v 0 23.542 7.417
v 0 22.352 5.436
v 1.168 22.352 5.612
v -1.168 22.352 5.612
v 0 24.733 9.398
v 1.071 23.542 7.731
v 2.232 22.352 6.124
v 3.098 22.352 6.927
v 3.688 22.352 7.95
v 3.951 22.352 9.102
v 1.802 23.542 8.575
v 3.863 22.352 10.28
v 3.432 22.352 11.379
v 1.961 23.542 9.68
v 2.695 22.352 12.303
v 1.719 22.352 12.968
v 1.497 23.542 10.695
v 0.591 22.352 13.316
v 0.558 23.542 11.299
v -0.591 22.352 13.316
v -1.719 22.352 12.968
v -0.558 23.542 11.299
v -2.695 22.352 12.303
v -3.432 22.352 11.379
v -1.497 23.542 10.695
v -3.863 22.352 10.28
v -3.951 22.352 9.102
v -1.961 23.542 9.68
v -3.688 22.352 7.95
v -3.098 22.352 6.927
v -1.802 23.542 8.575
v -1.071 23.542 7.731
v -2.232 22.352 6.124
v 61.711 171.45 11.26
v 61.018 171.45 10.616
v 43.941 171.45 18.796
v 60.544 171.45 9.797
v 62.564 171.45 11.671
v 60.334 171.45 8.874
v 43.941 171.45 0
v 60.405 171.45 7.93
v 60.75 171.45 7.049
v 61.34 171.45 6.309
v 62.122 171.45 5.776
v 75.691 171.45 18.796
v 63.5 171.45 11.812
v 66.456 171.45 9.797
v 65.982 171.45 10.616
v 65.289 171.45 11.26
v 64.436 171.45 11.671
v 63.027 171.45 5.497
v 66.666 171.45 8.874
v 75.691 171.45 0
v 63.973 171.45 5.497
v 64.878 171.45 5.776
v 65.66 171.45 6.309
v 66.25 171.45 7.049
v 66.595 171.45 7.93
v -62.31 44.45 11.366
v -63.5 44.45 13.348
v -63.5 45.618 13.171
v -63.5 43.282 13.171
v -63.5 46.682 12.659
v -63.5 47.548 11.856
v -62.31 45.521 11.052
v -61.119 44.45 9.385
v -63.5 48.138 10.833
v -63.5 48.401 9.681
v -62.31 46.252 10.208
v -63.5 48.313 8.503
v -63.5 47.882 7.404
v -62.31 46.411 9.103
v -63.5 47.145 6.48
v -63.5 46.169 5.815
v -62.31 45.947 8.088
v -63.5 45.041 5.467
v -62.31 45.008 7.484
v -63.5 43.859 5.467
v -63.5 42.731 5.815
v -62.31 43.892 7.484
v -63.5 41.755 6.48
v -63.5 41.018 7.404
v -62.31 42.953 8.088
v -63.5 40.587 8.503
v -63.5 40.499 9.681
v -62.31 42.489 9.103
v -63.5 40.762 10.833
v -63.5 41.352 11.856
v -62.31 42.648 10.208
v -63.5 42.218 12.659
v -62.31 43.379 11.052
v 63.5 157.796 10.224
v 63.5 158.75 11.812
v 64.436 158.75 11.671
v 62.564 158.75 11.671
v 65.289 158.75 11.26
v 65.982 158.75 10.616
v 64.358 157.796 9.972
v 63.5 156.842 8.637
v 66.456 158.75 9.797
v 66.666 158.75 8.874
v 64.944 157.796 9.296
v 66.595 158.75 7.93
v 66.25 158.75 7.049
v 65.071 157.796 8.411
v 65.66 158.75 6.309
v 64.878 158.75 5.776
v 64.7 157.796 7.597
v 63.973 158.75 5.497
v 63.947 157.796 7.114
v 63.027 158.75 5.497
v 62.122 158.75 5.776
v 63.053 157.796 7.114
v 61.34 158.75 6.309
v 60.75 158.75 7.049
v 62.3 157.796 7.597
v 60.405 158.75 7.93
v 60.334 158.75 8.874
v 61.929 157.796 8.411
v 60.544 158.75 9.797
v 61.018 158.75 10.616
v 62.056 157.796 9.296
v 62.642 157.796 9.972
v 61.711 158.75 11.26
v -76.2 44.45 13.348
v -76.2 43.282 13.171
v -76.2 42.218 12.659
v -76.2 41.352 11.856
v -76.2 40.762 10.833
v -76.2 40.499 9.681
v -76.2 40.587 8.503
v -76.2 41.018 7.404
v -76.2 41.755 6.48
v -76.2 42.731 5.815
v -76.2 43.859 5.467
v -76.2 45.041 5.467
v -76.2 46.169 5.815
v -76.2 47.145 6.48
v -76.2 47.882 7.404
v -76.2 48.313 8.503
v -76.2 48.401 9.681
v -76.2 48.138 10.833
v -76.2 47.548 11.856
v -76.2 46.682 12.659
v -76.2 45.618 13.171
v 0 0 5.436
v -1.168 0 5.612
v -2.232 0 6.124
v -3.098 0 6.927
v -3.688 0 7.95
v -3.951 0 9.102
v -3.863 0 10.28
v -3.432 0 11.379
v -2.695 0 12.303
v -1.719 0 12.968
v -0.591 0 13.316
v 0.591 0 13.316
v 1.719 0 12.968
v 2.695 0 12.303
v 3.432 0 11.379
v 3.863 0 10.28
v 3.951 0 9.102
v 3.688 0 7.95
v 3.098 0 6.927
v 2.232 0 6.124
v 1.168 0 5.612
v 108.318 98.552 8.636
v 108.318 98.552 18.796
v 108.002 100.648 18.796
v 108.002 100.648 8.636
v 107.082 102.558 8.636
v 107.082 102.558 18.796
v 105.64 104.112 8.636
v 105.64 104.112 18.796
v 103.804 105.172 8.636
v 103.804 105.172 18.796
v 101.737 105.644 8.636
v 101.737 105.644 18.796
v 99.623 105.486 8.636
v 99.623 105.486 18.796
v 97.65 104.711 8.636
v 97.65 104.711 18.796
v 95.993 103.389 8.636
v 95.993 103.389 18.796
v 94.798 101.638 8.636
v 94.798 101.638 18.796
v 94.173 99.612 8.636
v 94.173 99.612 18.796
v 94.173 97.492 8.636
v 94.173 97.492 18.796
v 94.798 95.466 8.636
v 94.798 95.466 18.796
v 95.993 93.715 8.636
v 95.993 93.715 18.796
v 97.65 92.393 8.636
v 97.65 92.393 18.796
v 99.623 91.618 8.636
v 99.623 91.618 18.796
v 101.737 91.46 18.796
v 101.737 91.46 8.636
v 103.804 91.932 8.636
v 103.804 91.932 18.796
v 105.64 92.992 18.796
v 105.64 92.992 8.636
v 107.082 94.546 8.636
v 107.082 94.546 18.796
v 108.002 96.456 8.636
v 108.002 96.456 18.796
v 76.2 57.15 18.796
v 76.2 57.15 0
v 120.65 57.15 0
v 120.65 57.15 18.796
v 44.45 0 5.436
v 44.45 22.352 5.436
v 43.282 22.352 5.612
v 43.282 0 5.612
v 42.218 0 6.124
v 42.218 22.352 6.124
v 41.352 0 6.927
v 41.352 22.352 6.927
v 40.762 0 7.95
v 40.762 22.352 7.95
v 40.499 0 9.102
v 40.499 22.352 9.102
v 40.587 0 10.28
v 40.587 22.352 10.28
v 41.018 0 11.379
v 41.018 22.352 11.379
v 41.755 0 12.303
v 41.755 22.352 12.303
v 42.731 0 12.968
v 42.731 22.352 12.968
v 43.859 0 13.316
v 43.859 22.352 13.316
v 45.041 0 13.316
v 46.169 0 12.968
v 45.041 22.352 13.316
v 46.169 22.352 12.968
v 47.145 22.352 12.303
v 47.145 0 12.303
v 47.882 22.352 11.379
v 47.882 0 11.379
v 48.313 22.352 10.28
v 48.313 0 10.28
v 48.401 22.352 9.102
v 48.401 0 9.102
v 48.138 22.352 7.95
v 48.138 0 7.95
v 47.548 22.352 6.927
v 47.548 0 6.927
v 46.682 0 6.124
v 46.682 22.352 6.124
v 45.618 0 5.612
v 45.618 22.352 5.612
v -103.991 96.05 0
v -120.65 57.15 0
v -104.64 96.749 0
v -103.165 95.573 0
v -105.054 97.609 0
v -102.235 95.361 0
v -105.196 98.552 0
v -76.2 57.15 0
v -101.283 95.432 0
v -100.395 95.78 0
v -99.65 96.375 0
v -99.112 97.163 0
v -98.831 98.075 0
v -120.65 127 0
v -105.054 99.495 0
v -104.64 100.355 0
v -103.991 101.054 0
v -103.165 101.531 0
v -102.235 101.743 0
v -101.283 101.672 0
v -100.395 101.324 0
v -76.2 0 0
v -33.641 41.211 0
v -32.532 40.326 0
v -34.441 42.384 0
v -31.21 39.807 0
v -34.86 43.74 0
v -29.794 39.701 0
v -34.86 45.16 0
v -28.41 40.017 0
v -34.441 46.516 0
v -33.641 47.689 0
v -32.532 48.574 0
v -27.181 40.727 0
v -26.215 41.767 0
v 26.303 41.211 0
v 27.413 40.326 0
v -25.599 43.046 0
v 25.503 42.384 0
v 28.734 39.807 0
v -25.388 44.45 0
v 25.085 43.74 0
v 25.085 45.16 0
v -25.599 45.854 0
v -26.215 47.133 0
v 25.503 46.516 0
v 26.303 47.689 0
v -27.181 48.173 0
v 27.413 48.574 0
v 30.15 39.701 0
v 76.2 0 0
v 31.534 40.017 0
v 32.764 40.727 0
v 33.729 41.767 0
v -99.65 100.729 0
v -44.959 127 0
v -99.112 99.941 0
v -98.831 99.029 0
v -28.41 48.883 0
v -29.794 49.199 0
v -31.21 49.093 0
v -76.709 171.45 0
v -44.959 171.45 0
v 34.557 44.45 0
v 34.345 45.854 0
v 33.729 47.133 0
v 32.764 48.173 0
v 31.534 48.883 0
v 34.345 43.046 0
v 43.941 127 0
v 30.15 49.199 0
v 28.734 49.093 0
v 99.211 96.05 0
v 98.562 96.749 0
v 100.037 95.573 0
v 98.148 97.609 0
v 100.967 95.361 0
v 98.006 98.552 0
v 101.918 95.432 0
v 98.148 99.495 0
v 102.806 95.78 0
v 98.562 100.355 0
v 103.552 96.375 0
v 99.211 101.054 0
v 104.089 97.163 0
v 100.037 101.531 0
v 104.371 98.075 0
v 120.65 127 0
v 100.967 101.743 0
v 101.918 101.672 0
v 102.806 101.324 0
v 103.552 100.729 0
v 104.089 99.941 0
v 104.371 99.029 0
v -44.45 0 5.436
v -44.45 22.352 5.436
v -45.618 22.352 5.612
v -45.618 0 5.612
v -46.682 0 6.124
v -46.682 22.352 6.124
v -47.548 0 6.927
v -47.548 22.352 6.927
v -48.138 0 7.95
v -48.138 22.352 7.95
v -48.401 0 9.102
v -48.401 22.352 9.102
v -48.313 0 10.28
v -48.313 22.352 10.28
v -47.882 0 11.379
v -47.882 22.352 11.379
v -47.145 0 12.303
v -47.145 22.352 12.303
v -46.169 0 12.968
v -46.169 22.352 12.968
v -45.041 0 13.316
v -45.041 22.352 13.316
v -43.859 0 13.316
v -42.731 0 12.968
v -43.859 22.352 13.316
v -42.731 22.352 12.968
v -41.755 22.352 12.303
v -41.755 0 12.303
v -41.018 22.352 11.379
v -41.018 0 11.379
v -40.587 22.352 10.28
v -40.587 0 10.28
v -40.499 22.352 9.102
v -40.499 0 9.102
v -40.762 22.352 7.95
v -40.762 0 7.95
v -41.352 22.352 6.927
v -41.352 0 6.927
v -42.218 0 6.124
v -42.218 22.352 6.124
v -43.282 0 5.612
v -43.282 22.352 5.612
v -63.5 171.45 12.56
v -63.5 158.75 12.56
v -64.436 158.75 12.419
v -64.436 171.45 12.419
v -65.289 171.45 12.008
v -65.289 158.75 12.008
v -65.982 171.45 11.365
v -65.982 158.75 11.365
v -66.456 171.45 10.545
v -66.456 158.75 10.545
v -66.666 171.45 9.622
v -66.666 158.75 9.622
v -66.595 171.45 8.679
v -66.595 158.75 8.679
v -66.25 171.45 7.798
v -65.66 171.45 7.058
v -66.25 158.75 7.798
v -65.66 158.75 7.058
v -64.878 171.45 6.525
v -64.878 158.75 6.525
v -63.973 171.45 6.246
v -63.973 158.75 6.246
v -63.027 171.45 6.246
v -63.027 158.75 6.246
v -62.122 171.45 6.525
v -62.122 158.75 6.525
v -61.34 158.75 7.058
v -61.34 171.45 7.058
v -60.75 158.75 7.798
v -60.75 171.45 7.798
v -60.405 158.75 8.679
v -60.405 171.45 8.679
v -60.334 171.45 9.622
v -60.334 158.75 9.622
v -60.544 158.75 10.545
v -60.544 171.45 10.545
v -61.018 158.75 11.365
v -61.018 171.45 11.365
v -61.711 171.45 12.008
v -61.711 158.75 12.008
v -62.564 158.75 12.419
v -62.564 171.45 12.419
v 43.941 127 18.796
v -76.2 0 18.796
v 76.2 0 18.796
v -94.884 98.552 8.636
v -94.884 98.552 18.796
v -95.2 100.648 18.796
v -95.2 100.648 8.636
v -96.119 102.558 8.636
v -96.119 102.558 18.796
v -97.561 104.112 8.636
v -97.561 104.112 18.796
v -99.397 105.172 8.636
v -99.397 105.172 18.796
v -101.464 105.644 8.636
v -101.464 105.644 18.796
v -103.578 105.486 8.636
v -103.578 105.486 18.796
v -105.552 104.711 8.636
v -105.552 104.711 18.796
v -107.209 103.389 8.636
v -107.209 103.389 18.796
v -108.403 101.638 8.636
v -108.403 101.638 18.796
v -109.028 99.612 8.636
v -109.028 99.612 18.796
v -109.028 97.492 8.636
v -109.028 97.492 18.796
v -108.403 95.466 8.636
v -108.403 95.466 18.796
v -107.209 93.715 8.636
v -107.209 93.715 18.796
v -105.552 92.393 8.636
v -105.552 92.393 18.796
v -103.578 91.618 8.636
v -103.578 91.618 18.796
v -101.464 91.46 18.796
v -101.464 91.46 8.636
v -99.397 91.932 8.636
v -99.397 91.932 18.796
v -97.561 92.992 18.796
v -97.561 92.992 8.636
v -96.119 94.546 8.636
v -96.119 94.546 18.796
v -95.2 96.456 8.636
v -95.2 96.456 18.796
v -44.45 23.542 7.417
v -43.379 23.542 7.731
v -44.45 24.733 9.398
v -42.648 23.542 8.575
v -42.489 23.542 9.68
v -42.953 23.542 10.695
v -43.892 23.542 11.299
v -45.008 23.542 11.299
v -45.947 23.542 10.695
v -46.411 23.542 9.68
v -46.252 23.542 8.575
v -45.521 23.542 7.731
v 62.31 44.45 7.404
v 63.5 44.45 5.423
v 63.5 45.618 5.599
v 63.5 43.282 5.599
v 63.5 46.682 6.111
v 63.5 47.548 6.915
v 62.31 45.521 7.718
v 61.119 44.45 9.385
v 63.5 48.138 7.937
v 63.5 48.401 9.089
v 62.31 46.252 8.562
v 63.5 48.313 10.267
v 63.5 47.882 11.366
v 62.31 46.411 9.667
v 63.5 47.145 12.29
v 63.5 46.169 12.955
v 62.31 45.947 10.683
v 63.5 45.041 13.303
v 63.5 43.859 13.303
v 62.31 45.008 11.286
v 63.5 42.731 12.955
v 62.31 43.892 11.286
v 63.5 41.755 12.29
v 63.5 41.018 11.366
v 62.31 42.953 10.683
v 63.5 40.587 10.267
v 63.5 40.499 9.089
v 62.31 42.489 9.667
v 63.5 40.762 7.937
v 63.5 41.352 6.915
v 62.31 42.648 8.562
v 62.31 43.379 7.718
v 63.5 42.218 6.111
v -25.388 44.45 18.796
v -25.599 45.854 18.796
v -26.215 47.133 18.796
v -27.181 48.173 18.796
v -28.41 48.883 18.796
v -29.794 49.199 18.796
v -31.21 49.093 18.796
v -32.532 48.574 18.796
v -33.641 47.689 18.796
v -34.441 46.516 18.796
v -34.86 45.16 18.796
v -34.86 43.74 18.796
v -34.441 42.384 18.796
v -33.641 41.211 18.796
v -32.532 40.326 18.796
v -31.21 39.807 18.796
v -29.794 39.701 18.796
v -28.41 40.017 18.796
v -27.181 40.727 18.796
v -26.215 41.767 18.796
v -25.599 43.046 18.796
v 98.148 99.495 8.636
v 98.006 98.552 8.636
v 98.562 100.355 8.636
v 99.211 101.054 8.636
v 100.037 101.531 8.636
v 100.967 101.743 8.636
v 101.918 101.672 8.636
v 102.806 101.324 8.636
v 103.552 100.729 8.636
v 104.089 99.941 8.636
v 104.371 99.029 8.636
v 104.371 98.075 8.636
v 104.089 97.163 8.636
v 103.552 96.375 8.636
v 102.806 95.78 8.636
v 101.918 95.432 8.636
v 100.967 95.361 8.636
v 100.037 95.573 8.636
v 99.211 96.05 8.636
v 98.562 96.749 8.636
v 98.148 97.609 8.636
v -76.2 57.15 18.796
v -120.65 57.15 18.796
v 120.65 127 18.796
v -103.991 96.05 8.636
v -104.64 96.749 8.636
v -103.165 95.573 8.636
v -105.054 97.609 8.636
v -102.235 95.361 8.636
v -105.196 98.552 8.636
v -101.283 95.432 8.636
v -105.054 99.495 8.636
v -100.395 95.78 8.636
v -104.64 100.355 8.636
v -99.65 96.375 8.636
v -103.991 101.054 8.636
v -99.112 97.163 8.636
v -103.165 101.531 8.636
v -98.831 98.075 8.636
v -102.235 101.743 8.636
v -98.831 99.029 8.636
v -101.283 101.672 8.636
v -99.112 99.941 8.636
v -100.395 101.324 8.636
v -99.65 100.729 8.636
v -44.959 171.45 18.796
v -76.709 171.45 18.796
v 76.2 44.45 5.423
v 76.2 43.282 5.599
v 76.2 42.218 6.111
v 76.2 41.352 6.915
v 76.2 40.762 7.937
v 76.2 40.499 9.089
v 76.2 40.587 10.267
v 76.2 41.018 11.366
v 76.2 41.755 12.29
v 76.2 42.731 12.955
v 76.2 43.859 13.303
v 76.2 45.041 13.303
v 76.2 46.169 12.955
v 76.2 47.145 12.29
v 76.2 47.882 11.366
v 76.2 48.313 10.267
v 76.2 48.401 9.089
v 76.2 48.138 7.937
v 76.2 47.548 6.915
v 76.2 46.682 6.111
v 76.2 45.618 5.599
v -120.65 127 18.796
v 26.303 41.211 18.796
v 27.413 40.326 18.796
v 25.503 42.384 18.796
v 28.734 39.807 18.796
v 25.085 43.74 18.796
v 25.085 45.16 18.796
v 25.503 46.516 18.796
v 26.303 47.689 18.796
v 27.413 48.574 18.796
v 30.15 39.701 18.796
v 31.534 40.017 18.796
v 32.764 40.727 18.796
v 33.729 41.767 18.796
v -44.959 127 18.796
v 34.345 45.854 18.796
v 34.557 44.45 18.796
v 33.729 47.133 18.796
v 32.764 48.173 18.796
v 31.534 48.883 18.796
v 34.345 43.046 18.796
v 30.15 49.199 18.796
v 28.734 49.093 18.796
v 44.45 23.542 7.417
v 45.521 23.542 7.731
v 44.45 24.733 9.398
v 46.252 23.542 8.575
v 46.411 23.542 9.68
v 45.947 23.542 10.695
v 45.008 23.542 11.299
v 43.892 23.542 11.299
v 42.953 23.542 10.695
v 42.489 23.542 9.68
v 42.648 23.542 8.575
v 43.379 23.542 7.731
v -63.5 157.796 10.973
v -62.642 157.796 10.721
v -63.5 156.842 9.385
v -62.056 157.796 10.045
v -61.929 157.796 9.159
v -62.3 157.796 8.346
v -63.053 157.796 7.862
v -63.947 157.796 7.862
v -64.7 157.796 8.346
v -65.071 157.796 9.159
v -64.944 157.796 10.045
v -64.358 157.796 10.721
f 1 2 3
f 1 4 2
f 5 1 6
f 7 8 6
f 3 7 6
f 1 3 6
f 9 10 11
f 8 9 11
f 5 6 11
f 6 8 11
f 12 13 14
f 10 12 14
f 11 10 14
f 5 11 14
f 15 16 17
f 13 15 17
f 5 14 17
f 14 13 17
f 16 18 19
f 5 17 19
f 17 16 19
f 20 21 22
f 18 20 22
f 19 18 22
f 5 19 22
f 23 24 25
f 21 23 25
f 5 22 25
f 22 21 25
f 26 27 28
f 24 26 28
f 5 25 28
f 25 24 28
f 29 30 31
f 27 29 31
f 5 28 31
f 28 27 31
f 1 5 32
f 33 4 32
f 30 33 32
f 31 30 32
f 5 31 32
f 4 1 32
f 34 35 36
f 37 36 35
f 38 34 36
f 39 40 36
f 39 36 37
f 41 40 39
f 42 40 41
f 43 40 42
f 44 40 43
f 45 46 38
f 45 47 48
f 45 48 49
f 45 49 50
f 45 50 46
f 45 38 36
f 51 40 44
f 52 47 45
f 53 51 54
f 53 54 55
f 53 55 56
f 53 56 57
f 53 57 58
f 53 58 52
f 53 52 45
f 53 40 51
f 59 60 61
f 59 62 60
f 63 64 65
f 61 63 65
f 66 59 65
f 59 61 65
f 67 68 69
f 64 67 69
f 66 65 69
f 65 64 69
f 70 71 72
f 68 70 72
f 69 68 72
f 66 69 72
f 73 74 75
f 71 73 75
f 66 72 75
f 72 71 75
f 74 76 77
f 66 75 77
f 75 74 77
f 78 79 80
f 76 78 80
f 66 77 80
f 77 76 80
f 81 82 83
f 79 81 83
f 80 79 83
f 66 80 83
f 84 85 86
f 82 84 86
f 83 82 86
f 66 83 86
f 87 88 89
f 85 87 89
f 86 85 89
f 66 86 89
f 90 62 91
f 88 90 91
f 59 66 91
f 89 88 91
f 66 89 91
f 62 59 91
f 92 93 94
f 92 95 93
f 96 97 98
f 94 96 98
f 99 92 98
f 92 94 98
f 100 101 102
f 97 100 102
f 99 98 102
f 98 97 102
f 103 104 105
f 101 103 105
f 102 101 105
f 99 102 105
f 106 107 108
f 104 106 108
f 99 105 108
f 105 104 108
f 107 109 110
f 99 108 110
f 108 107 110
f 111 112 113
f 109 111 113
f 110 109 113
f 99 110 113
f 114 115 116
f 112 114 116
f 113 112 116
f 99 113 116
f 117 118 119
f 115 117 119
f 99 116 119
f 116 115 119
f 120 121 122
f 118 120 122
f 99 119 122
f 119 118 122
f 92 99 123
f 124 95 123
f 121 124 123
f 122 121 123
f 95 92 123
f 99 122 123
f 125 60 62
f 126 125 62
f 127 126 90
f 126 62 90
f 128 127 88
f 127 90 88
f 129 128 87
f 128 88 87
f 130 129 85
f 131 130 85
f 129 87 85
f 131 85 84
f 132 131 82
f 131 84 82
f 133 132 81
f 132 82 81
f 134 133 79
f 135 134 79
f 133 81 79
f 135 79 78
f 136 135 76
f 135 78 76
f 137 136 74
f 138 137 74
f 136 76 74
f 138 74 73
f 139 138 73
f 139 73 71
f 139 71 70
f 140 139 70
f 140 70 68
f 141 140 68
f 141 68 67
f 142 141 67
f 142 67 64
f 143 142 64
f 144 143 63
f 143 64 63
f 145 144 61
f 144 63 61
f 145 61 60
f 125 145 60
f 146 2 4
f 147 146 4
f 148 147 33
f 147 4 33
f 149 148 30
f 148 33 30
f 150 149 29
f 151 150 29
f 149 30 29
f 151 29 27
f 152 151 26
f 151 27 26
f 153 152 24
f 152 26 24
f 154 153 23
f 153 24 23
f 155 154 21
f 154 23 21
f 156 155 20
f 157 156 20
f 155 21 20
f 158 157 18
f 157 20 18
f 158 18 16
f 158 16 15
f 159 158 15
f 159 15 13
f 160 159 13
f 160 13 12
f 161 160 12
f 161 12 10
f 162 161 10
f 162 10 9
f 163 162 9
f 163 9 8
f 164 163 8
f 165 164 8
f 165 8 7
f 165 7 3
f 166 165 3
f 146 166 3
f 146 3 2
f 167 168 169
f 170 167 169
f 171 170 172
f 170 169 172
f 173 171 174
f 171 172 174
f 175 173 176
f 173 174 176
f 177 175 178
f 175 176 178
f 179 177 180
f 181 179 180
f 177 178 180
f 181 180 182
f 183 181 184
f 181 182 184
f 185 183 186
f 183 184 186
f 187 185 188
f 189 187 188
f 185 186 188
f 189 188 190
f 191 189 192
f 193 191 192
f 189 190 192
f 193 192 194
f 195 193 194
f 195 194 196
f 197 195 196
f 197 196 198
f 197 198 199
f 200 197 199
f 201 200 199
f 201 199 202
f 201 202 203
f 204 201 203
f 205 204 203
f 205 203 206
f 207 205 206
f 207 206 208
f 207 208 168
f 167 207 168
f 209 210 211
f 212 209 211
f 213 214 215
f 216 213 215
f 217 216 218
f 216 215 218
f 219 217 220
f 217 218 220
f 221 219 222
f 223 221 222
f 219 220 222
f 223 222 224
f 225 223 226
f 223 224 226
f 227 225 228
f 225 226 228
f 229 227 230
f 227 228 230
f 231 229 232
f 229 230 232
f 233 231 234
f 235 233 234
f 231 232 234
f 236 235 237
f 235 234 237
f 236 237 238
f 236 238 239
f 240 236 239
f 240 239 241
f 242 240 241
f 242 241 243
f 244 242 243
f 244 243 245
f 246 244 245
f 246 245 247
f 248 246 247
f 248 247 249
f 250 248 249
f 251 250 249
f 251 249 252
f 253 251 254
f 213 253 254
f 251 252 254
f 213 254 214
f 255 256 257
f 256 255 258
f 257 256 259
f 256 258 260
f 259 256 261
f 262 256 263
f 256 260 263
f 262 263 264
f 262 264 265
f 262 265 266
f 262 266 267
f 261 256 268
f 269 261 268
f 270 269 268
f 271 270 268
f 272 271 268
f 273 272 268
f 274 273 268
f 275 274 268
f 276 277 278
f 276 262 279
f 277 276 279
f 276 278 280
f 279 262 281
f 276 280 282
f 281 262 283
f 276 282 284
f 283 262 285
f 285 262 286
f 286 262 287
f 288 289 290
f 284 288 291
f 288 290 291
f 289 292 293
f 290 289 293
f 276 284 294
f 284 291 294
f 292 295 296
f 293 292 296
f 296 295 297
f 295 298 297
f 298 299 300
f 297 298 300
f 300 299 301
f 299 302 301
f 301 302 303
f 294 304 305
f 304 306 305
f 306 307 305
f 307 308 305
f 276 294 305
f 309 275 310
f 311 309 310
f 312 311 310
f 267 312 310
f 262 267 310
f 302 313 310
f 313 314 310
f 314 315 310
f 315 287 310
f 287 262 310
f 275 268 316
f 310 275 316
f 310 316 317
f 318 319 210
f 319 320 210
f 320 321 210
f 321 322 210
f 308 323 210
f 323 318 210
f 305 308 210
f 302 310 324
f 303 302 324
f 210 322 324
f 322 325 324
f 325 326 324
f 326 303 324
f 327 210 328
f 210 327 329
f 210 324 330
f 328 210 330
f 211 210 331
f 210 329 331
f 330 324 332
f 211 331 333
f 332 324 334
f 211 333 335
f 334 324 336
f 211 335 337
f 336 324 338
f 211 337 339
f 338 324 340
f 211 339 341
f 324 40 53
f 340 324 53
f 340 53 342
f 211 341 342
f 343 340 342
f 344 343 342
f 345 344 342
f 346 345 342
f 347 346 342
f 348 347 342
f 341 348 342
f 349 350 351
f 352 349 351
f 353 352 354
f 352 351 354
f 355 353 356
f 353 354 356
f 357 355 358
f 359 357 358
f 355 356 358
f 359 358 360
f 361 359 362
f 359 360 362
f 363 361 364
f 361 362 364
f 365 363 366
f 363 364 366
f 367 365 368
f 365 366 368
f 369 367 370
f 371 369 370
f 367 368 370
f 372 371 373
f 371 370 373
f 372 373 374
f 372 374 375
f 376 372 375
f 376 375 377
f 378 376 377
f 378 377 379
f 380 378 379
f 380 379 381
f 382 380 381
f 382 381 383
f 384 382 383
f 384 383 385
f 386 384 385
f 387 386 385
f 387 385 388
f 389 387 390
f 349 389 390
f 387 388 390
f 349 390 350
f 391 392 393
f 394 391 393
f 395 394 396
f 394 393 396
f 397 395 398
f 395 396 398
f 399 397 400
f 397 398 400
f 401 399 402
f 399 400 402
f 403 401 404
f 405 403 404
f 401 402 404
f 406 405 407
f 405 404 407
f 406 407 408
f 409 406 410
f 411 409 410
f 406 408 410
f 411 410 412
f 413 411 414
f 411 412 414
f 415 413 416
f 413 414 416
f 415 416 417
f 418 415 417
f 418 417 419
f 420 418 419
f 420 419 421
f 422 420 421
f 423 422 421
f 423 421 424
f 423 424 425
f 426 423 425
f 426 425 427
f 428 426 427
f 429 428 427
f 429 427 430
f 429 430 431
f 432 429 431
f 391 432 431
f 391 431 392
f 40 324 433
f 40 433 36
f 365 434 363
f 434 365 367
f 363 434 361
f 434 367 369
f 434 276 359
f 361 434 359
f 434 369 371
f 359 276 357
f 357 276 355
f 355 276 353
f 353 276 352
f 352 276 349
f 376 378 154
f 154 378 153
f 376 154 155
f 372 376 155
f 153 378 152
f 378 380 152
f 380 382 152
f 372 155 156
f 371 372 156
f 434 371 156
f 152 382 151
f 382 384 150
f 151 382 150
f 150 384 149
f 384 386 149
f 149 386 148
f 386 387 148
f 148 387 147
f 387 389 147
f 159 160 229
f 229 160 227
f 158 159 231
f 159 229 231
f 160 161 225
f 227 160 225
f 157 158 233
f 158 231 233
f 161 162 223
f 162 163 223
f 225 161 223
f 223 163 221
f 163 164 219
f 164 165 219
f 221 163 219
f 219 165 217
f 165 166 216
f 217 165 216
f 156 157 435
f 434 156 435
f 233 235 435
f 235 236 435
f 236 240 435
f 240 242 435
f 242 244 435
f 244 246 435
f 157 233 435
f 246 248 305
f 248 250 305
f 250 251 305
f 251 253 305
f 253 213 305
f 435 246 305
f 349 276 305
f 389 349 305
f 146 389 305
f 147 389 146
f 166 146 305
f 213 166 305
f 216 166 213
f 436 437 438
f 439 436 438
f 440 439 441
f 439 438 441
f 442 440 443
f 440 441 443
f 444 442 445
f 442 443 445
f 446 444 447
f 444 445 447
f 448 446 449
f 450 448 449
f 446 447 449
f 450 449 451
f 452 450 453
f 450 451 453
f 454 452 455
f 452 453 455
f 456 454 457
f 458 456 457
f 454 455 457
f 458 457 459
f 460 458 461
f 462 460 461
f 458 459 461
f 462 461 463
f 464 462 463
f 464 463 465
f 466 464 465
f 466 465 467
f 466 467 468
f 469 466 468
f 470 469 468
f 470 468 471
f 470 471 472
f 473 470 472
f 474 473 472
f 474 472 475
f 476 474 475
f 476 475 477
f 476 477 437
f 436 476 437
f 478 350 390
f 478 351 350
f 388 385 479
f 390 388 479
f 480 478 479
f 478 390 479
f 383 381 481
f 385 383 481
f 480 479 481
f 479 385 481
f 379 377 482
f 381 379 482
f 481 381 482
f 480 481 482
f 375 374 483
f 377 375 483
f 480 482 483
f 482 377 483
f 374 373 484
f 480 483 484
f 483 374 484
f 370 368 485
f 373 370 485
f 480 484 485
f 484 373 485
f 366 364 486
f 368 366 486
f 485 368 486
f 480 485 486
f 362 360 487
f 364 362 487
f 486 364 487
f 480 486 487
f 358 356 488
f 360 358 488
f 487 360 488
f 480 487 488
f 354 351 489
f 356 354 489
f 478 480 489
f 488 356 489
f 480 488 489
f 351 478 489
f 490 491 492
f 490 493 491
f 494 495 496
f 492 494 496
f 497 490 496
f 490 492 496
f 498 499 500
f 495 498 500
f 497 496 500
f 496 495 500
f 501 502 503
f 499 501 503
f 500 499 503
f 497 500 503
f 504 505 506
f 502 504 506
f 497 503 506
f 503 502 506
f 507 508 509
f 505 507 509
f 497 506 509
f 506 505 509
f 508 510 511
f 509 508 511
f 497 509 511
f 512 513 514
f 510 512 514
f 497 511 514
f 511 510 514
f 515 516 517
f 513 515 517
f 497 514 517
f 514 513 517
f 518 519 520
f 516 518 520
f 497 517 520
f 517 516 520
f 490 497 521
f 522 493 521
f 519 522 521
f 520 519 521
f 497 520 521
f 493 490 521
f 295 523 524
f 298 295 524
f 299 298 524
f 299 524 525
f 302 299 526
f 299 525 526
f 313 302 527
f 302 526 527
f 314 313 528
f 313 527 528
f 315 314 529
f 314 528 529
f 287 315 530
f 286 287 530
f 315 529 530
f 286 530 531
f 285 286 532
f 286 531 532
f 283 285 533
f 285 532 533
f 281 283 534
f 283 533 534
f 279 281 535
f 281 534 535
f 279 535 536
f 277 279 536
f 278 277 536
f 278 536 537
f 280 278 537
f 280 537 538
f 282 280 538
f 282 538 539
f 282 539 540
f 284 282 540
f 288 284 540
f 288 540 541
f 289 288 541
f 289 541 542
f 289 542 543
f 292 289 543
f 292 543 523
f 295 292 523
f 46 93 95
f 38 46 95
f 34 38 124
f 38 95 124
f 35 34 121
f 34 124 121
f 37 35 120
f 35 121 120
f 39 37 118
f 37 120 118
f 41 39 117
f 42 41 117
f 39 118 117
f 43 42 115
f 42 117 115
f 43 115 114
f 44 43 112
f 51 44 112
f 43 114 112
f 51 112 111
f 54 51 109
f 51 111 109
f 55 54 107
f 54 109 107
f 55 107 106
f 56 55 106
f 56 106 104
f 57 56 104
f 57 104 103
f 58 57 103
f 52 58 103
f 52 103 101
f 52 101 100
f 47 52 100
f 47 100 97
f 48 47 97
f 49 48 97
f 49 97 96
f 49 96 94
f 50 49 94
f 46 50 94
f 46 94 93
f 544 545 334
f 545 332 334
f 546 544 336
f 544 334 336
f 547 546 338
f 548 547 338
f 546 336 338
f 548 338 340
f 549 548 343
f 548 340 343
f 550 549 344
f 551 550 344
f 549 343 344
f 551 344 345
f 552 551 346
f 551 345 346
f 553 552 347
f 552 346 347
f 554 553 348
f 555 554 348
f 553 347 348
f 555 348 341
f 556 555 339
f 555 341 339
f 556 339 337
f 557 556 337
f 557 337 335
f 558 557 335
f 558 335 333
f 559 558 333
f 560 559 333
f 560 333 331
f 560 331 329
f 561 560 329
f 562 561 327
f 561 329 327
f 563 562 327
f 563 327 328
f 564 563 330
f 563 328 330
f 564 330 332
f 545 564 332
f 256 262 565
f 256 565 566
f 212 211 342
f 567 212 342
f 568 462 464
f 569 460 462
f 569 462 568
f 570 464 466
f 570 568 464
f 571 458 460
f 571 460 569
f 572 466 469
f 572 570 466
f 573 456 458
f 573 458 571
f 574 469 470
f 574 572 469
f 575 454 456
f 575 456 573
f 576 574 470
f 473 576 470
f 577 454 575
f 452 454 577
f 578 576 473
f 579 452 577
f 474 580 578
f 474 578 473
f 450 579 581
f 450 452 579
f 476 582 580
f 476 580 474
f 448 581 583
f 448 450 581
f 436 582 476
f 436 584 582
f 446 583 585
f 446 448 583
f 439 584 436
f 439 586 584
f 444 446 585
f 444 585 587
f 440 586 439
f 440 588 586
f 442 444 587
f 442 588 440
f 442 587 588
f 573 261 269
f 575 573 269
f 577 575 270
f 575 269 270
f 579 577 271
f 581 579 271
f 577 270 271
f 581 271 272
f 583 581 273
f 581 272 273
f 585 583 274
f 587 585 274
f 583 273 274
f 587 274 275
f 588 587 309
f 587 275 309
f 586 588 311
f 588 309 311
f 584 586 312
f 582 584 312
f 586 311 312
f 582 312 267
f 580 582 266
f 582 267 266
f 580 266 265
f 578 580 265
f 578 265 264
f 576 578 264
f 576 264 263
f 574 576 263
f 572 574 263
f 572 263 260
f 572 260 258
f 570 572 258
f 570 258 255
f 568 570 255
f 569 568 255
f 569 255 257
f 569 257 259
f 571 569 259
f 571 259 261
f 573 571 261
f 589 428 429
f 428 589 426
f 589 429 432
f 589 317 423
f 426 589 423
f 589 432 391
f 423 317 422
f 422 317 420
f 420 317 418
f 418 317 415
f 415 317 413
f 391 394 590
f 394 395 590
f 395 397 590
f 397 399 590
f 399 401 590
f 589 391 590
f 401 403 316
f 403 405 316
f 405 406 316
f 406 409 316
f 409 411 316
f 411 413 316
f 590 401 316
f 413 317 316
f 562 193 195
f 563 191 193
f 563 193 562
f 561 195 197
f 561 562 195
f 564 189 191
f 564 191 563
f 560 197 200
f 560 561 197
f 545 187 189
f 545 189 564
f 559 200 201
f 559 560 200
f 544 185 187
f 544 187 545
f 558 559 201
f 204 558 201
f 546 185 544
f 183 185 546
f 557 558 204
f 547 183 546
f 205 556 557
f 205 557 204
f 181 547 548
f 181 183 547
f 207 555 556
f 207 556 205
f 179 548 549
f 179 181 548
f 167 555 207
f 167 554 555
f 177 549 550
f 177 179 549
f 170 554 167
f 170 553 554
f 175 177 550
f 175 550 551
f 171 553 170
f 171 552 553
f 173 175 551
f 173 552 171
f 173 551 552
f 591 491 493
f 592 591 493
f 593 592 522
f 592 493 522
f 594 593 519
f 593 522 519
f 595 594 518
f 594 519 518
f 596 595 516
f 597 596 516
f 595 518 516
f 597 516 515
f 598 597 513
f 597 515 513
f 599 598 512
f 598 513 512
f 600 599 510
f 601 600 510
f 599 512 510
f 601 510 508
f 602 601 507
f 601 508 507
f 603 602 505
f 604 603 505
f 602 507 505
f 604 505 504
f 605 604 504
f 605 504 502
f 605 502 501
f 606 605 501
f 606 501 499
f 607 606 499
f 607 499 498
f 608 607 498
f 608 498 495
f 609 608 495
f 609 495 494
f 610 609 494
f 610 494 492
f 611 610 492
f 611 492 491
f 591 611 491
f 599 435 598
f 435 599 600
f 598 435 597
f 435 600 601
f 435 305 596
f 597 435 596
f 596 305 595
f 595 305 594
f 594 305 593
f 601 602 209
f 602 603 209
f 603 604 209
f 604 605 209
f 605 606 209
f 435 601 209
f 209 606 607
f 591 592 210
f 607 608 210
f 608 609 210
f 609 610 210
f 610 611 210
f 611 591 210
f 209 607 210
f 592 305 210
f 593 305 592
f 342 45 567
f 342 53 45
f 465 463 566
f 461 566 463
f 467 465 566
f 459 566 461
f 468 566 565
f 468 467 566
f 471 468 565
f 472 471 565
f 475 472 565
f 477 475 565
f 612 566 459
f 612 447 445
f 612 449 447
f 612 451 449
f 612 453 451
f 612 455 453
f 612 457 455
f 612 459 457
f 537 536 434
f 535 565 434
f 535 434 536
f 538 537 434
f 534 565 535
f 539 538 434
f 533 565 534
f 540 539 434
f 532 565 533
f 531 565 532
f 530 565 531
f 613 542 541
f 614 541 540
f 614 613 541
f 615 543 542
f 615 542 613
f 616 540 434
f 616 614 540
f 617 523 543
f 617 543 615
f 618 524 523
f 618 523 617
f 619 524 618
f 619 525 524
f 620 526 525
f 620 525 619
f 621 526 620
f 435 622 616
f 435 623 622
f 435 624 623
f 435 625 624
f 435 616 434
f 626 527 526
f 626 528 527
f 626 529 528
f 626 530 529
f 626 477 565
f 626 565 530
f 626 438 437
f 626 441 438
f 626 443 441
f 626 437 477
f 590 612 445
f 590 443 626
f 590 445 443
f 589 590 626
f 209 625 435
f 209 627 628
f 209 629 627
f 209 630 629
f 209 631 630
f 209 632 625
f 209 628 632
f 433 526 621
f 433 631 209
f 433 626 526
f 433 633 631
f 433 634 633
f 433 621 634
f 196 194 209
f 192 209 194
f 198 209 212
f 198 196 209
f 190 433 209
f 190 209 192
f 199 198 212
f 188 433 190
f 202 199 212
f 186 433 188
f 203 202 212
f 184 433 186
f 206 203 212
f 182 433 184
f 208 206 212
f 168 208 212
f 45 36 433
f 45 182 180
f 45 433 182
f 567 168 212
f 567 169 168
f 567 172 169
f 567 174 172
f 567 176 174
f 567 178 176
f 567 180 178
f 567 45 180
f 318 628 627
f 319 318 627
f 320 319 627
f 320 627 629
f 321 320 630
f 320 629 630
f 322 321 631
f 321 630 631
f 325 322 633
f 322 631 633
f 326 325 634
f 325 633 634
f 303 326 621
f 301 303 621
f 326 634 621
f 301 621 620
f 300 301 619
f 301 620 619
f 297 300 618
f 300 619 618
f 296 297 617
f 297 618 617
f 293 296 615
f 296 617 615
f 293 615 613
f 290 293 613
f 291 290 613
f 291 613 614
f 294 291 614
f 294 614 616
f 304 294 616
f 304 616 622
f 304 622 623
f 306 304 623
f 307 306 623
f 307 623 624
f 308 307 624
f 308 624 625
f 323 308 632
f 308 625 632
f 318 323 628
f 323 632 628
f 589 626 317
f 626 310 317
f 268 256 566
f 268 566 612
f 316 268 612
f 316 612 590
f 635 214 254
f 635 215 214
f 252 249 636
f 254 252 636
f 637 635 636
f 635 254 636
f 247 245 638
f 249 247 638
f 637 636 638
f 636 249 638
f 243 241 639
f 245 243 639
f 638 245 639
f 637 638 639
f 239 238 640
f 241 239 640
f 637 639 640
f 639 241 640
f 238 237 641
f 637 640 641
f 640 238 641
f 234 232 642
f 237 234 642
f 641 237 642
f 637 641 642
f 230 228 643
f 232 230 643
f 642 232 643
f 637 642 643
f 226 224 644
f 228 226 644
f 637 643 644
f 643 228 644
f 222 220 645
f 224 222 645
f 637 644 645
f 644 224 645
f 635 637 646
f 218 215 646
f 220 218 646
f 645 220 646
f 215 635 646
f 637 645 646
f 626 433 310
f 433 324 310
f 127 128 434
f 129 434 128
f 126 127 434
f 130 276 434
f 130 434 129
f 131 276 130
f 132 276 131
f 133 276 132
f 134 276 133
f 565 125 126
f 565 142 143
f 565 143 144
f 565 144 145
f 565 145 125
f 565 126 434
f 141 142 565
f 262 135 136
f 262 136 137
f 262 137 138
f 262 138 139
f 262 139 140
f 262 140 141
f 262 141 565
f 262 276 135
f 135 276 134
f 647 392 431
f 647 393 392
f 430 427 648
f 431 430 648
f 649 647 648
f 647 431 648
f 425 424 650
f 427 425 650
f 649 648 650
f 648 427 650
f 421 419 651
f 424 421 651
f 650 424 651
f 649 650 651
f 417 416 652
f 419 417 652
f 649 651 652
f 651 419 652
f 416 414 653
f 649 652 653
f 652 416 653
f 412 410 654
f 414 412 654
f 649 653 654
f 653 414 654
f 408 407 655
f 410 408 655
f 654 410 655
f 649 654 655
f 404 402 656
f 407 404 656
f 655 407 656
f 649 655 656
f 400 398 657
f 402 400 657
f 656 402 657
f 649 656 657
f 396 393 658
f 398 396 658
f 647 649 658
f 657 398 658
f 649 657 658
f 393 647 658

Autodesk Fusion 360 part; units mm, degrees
sketch "Sketch1" plane through (0, 0, 0) normal (0, 0, 1) x (1, 0, 0)
  line L0 (-76.2, 0) -> (76.2, 0)
  line L1 (76.2, 0) -> (76.2, 57.15)
  line L2 (76.2, 57.15) -> (120.65, 57.15)
  line L3 (120.65, 57.15) -> (120.65, 127)
  line L4 (-0.5088, 127) -> (43.9412, 127)
  line L5 (43.9412, 127) -> (43.9412, 171.45)
  line L6 (43.9412, 171.45) -> (75.6912, 171.45)
  line L7 (75.6912, 171.45) -> (120.65, 127)
  line L8 (-0.5088, 127) -> (-44.9588, 127)
  line L9 (-44.9588, 127) -> (-44.9588, 171.45)
  line L10 (-44.9588, 171.45) -> (-76.7088, 171.45)
  line L11 (-76.2, 0) -> (-76.2, 57.15)
  line L12 (-76.2, 57.15) -> (-120.65, 57.15)
  line L13 (-120.65, 57.15) -> (-120.65, 127)
  line L14 (-120.65, 127) -> (-76.7088, 171.45)
  dimension "d1" = 57.15
  dimension "d2" = 44.45
  dimension "d3" = 69.85
  dimension "d4" = 44.45
  dimension "d5" = 44.45
  dimension "d6" = 31.75
  dimension "d7" = 44.45
  dimension "d8" = 44.45
  dimension "d9" = 31.75
  dimension "d10" = 57.15
  dimension "d11" = 44.45
  dimension "d12" = 69.85
extrude "Extrude1" add sketch "Sketch1" along normal blind 18.796
sketch "Sketch2" plane through (0, 0, 18.796) normal (0, 0, 1) x (1, 0, 0)
  line L0 (-76.2, 0) -> (76.2, 0)
  line L1 (76.2, 0) -> (76.2, 57.15)
  line L2 (76.2, 57.15) -> (120.65, 57.15)
  line L3 (120.65, 57.15) -> (120.65, 127)
  line L4 (120.65, 127) -> (75.6912, 171.45)
  line L5 (75.6912, 171.45) -> (43.9412, 171.45)
  line L6 (43.9412, 171.45) -> (43.9412, 127)
  line L7 (43.9412, 127) -> (-44.9588, 127)
  line L8 (-44.9588, 127) -> (-44.9588, 171.45)
  line L9 (-44.9588, 171.45) -> (-76.7088, 171.45)
  line L10 (-76.7088, 171.45) -> (-120.65, 127)
  line L11 (-120.65, 127) -> (-120.65, 57.15)
  line L12 (-120.65, 57.15) -> (-76.2, 57.15)
  line L13 (-76.2, 57.15) -> (-76.2, 0)
  circle A0 centre (-30.1503, 44.45) radius 4.7625
  circle A1 centre (29.7942, 44.45) radius 4.7625
  line L14 (0, 0) -> (-0.5088, 127)
  circle A2 centre (101.206, 98.552) radius 7.112
  circle A3 centre (-101.9956, 98.552) radius 7.112
  dimension "d15" = 9.525
  dimension "d16" = 9.525
  dimension "d17" = 44.45
  dimension "d18" = 29.972
  dimension "d19" = 29.972
  dimension "d20" = 44.45
  dimension "d21" = 14.224
  dimension "d22" = 14.224
  dimension "d23" = 101.6
  dimension "d24" = 98.552
  dimension "d25" = 101.6
  dimension "d26" = 98.552
sketch "Sketch3" plane through (76.2, 0, 0) normal (1, 0, 0) x (0, 0, -1)
  line L0 (0, 0) -> (0, 57.15)
  line L1 (0, 57.15) -> (-18.796, 57.15)
  line L2 (-18.796, 57.15) -> (-18.796, 0)
  line L3 (-18.796, 0) -> (0, 0)
  circle A0 centre (-9.3851, 44.45) radius 3.9624
  dimension "d27" = 7.9248
  dimension "d28" = 44.45
sketch "Sketch4" plane through (-76.2, 0, 0) normal (-1, 0, 0) x (0, 0, 1)
  line L0 (0, 57.15) -> (0, 0)
  line L1 (0, 0) -> (18.796, 0)
  line L2 (18.796, 0) -> (18.796, 57.15)
  line L3 (18.796, 57.15) -> (0, 57.15)
  circle A0 centre (9.3851, 44.45) radius 3.9624
sketch "Sketch5" plane through (0, 0, 0) normal (0, 0, -1) x (-1, 0, 0)
  line L0 (-76.2, 0) -> (76.2, 0)
  line L1 (76.2, 0) -> (76.2, 57.15)
  line L2 (76.2, 57.15) -> (120.65, 57.15)
  line L3 (120.65, 57.15) -> (120.65, 127)
  line L4 (120.65, 127) -> (76.7088, 171.45)
  line L5 (76.7088, 171.45) -> (44.9588, 171.45)
  line L6 (44.9588, 171.45) -> (44.9588, 127)
  line L7 (44.9588, 127) -> (-43.9412, 127)
  line L8 (-43.9412, 127) -> (-43.9412, 171.45)
  line L9 (-43.9412, 171.45) -> (-75.6912, 171.45)
  line L10 (-75.6912, 171.45) -> (-120.65, 127)
  line L11 (-120.65, 127) -> (-120.65, 57.15)
  line L12 (-120.65, 57.15) -> (-76.2, 57.15)
  line L13 (-76.2, 57.15) -> (-76.2, 0)
  circle A0 centre (-101.206, 98.552) radius 3.2004
  circle A1 centre (101.9956, 98.552) radius 3.2004
  dimension "d29" = 6.4008
  dimension "d30" = 6.4008
extrude "Extrude2" cut sketch "Sketch2" against normal blind 10.16 contours A0 | A1 | A2 | A3
extrude "Extrude3" cut 2 faces at (-29.7265, 42.4344, 8.636) (28.3639, 44.6971, 8.636) along direction (0, 0, -1) blind 48.26
extrude "Extrude4" cut sketch "Sketch5" against normal blind 8.636 contours A0 | A1
sketch "Sketch6" plane through (0, 0, 0) normal (0, -1, 0) x (1, 0, 0)
  line L0 (-76.2, 0) -> (76.2, 0)
  line L1 (76.2, 0) -> (76.2, 18.796)
  line L2 (76.2, 18.796) -> (-76.2, 18.796)
  line L3 (-76.2, 18.796) -> (-76.2, 0)
  circle A0 centre (0, 9.398) radius 3.9624
  circle A1 centre (44.45, 9.398) radius 3.9624
  circle A2 centre (-44.45, 9.398) radius 3.9624
  dimension "d37" = 7.9248
  dimension "d38" = 7.9248
  dimension "d39" = 7.9248
  dimension "d40" = 44.45
  dimension "d41" = 44.45
hole "Hole1" at (-44.45, 0, 9.398) at (0, 0, 9.398) at (44.45, 0, 9.398) direction (0, 1, 0) diameter 7.9248 depth 22.352 tip angle 118
hole "Hole2" at (76.2, 44.45, 9.3851) direction (-1, 0, 0) diameter 7.9248 depth 12.7 tip angle 118
hole "Hole3" at (-76.2, 44.45, 9.3851) direction (1, 0, 0) diameter 7.9248 depth 12.7 tip angle 118
sketch "Sketch7" plane through (0, 171.45, 0) normal (0, 1, 0) x (-1, 0, 0)
  line L0 (-75.6912, 0) -> (-43.9412, 0)
  line L1 (-43.9412, 0) -> (-43.9412, 18.796)
  line L2 (-43.9412, 18.796) -> (-75.6912, 18.796)
  line L3 (-75.6912, 18.796) -> (-75.6912, 0)
  circle A0 centre (-63.5, 9.3851) radius 3.175
  circle A1 centre (63.5, 9.3851) radius 3.175
  line L4 (63.5, 13.3475) -> (63.5, 5.4227)
  line L5 (76.2, 18.796) -> (-76.2, 18.796)
  line L6 (0, 0) -> (0, 18.796)
  dimension "d52" = 6.35
  dimension "d53" = 6.35
  dimension "d54" = 63.5
  dimension "d55" = 63.5
hole "Hole4" at (-63.5, 171.45, 9.3851) direction (0, -1, 0) diameter 6.35 depth 12.7 tip angle 118
sketch "Sketch8" plane through (0, 171.45, 0) normal (0, 1, 0) x (-1, 0, 0)
  line L0 (-75.6912, 0) -> (-43.9412, 0)
  line L1 (-43.9412, 0) -> (-43.9412, 18.796)
  line L2 (-43.9412, 18.796) -> (-75.6912, 18.796)
  line L3 (-75.6912, 18.796) -> (-75.6912, 0)
  circle A0 centre (-63.5, 8.6368) radius 3.175
  dimension "d59" = 6.35
  dimension "d60" = 127
hole "Hole5" at (63.5, 171.45, 8.6368) direction (0, -1, 0) diameter 6.35 depth 12.7 tip angle 118
thread "Thread1" thread offset 0 thread length 10.0076
thread "Thread2" thread offset 0 thread length 10.0076
thread "Thread3" thread offset 0 thread length 10.0076
thread "Thread4" thread offset 0 thread length 10.0076
thread "Thread5" thread offset 0 thread length 18.796
thread "Thread6" thread offset 0 thread length 18.796
